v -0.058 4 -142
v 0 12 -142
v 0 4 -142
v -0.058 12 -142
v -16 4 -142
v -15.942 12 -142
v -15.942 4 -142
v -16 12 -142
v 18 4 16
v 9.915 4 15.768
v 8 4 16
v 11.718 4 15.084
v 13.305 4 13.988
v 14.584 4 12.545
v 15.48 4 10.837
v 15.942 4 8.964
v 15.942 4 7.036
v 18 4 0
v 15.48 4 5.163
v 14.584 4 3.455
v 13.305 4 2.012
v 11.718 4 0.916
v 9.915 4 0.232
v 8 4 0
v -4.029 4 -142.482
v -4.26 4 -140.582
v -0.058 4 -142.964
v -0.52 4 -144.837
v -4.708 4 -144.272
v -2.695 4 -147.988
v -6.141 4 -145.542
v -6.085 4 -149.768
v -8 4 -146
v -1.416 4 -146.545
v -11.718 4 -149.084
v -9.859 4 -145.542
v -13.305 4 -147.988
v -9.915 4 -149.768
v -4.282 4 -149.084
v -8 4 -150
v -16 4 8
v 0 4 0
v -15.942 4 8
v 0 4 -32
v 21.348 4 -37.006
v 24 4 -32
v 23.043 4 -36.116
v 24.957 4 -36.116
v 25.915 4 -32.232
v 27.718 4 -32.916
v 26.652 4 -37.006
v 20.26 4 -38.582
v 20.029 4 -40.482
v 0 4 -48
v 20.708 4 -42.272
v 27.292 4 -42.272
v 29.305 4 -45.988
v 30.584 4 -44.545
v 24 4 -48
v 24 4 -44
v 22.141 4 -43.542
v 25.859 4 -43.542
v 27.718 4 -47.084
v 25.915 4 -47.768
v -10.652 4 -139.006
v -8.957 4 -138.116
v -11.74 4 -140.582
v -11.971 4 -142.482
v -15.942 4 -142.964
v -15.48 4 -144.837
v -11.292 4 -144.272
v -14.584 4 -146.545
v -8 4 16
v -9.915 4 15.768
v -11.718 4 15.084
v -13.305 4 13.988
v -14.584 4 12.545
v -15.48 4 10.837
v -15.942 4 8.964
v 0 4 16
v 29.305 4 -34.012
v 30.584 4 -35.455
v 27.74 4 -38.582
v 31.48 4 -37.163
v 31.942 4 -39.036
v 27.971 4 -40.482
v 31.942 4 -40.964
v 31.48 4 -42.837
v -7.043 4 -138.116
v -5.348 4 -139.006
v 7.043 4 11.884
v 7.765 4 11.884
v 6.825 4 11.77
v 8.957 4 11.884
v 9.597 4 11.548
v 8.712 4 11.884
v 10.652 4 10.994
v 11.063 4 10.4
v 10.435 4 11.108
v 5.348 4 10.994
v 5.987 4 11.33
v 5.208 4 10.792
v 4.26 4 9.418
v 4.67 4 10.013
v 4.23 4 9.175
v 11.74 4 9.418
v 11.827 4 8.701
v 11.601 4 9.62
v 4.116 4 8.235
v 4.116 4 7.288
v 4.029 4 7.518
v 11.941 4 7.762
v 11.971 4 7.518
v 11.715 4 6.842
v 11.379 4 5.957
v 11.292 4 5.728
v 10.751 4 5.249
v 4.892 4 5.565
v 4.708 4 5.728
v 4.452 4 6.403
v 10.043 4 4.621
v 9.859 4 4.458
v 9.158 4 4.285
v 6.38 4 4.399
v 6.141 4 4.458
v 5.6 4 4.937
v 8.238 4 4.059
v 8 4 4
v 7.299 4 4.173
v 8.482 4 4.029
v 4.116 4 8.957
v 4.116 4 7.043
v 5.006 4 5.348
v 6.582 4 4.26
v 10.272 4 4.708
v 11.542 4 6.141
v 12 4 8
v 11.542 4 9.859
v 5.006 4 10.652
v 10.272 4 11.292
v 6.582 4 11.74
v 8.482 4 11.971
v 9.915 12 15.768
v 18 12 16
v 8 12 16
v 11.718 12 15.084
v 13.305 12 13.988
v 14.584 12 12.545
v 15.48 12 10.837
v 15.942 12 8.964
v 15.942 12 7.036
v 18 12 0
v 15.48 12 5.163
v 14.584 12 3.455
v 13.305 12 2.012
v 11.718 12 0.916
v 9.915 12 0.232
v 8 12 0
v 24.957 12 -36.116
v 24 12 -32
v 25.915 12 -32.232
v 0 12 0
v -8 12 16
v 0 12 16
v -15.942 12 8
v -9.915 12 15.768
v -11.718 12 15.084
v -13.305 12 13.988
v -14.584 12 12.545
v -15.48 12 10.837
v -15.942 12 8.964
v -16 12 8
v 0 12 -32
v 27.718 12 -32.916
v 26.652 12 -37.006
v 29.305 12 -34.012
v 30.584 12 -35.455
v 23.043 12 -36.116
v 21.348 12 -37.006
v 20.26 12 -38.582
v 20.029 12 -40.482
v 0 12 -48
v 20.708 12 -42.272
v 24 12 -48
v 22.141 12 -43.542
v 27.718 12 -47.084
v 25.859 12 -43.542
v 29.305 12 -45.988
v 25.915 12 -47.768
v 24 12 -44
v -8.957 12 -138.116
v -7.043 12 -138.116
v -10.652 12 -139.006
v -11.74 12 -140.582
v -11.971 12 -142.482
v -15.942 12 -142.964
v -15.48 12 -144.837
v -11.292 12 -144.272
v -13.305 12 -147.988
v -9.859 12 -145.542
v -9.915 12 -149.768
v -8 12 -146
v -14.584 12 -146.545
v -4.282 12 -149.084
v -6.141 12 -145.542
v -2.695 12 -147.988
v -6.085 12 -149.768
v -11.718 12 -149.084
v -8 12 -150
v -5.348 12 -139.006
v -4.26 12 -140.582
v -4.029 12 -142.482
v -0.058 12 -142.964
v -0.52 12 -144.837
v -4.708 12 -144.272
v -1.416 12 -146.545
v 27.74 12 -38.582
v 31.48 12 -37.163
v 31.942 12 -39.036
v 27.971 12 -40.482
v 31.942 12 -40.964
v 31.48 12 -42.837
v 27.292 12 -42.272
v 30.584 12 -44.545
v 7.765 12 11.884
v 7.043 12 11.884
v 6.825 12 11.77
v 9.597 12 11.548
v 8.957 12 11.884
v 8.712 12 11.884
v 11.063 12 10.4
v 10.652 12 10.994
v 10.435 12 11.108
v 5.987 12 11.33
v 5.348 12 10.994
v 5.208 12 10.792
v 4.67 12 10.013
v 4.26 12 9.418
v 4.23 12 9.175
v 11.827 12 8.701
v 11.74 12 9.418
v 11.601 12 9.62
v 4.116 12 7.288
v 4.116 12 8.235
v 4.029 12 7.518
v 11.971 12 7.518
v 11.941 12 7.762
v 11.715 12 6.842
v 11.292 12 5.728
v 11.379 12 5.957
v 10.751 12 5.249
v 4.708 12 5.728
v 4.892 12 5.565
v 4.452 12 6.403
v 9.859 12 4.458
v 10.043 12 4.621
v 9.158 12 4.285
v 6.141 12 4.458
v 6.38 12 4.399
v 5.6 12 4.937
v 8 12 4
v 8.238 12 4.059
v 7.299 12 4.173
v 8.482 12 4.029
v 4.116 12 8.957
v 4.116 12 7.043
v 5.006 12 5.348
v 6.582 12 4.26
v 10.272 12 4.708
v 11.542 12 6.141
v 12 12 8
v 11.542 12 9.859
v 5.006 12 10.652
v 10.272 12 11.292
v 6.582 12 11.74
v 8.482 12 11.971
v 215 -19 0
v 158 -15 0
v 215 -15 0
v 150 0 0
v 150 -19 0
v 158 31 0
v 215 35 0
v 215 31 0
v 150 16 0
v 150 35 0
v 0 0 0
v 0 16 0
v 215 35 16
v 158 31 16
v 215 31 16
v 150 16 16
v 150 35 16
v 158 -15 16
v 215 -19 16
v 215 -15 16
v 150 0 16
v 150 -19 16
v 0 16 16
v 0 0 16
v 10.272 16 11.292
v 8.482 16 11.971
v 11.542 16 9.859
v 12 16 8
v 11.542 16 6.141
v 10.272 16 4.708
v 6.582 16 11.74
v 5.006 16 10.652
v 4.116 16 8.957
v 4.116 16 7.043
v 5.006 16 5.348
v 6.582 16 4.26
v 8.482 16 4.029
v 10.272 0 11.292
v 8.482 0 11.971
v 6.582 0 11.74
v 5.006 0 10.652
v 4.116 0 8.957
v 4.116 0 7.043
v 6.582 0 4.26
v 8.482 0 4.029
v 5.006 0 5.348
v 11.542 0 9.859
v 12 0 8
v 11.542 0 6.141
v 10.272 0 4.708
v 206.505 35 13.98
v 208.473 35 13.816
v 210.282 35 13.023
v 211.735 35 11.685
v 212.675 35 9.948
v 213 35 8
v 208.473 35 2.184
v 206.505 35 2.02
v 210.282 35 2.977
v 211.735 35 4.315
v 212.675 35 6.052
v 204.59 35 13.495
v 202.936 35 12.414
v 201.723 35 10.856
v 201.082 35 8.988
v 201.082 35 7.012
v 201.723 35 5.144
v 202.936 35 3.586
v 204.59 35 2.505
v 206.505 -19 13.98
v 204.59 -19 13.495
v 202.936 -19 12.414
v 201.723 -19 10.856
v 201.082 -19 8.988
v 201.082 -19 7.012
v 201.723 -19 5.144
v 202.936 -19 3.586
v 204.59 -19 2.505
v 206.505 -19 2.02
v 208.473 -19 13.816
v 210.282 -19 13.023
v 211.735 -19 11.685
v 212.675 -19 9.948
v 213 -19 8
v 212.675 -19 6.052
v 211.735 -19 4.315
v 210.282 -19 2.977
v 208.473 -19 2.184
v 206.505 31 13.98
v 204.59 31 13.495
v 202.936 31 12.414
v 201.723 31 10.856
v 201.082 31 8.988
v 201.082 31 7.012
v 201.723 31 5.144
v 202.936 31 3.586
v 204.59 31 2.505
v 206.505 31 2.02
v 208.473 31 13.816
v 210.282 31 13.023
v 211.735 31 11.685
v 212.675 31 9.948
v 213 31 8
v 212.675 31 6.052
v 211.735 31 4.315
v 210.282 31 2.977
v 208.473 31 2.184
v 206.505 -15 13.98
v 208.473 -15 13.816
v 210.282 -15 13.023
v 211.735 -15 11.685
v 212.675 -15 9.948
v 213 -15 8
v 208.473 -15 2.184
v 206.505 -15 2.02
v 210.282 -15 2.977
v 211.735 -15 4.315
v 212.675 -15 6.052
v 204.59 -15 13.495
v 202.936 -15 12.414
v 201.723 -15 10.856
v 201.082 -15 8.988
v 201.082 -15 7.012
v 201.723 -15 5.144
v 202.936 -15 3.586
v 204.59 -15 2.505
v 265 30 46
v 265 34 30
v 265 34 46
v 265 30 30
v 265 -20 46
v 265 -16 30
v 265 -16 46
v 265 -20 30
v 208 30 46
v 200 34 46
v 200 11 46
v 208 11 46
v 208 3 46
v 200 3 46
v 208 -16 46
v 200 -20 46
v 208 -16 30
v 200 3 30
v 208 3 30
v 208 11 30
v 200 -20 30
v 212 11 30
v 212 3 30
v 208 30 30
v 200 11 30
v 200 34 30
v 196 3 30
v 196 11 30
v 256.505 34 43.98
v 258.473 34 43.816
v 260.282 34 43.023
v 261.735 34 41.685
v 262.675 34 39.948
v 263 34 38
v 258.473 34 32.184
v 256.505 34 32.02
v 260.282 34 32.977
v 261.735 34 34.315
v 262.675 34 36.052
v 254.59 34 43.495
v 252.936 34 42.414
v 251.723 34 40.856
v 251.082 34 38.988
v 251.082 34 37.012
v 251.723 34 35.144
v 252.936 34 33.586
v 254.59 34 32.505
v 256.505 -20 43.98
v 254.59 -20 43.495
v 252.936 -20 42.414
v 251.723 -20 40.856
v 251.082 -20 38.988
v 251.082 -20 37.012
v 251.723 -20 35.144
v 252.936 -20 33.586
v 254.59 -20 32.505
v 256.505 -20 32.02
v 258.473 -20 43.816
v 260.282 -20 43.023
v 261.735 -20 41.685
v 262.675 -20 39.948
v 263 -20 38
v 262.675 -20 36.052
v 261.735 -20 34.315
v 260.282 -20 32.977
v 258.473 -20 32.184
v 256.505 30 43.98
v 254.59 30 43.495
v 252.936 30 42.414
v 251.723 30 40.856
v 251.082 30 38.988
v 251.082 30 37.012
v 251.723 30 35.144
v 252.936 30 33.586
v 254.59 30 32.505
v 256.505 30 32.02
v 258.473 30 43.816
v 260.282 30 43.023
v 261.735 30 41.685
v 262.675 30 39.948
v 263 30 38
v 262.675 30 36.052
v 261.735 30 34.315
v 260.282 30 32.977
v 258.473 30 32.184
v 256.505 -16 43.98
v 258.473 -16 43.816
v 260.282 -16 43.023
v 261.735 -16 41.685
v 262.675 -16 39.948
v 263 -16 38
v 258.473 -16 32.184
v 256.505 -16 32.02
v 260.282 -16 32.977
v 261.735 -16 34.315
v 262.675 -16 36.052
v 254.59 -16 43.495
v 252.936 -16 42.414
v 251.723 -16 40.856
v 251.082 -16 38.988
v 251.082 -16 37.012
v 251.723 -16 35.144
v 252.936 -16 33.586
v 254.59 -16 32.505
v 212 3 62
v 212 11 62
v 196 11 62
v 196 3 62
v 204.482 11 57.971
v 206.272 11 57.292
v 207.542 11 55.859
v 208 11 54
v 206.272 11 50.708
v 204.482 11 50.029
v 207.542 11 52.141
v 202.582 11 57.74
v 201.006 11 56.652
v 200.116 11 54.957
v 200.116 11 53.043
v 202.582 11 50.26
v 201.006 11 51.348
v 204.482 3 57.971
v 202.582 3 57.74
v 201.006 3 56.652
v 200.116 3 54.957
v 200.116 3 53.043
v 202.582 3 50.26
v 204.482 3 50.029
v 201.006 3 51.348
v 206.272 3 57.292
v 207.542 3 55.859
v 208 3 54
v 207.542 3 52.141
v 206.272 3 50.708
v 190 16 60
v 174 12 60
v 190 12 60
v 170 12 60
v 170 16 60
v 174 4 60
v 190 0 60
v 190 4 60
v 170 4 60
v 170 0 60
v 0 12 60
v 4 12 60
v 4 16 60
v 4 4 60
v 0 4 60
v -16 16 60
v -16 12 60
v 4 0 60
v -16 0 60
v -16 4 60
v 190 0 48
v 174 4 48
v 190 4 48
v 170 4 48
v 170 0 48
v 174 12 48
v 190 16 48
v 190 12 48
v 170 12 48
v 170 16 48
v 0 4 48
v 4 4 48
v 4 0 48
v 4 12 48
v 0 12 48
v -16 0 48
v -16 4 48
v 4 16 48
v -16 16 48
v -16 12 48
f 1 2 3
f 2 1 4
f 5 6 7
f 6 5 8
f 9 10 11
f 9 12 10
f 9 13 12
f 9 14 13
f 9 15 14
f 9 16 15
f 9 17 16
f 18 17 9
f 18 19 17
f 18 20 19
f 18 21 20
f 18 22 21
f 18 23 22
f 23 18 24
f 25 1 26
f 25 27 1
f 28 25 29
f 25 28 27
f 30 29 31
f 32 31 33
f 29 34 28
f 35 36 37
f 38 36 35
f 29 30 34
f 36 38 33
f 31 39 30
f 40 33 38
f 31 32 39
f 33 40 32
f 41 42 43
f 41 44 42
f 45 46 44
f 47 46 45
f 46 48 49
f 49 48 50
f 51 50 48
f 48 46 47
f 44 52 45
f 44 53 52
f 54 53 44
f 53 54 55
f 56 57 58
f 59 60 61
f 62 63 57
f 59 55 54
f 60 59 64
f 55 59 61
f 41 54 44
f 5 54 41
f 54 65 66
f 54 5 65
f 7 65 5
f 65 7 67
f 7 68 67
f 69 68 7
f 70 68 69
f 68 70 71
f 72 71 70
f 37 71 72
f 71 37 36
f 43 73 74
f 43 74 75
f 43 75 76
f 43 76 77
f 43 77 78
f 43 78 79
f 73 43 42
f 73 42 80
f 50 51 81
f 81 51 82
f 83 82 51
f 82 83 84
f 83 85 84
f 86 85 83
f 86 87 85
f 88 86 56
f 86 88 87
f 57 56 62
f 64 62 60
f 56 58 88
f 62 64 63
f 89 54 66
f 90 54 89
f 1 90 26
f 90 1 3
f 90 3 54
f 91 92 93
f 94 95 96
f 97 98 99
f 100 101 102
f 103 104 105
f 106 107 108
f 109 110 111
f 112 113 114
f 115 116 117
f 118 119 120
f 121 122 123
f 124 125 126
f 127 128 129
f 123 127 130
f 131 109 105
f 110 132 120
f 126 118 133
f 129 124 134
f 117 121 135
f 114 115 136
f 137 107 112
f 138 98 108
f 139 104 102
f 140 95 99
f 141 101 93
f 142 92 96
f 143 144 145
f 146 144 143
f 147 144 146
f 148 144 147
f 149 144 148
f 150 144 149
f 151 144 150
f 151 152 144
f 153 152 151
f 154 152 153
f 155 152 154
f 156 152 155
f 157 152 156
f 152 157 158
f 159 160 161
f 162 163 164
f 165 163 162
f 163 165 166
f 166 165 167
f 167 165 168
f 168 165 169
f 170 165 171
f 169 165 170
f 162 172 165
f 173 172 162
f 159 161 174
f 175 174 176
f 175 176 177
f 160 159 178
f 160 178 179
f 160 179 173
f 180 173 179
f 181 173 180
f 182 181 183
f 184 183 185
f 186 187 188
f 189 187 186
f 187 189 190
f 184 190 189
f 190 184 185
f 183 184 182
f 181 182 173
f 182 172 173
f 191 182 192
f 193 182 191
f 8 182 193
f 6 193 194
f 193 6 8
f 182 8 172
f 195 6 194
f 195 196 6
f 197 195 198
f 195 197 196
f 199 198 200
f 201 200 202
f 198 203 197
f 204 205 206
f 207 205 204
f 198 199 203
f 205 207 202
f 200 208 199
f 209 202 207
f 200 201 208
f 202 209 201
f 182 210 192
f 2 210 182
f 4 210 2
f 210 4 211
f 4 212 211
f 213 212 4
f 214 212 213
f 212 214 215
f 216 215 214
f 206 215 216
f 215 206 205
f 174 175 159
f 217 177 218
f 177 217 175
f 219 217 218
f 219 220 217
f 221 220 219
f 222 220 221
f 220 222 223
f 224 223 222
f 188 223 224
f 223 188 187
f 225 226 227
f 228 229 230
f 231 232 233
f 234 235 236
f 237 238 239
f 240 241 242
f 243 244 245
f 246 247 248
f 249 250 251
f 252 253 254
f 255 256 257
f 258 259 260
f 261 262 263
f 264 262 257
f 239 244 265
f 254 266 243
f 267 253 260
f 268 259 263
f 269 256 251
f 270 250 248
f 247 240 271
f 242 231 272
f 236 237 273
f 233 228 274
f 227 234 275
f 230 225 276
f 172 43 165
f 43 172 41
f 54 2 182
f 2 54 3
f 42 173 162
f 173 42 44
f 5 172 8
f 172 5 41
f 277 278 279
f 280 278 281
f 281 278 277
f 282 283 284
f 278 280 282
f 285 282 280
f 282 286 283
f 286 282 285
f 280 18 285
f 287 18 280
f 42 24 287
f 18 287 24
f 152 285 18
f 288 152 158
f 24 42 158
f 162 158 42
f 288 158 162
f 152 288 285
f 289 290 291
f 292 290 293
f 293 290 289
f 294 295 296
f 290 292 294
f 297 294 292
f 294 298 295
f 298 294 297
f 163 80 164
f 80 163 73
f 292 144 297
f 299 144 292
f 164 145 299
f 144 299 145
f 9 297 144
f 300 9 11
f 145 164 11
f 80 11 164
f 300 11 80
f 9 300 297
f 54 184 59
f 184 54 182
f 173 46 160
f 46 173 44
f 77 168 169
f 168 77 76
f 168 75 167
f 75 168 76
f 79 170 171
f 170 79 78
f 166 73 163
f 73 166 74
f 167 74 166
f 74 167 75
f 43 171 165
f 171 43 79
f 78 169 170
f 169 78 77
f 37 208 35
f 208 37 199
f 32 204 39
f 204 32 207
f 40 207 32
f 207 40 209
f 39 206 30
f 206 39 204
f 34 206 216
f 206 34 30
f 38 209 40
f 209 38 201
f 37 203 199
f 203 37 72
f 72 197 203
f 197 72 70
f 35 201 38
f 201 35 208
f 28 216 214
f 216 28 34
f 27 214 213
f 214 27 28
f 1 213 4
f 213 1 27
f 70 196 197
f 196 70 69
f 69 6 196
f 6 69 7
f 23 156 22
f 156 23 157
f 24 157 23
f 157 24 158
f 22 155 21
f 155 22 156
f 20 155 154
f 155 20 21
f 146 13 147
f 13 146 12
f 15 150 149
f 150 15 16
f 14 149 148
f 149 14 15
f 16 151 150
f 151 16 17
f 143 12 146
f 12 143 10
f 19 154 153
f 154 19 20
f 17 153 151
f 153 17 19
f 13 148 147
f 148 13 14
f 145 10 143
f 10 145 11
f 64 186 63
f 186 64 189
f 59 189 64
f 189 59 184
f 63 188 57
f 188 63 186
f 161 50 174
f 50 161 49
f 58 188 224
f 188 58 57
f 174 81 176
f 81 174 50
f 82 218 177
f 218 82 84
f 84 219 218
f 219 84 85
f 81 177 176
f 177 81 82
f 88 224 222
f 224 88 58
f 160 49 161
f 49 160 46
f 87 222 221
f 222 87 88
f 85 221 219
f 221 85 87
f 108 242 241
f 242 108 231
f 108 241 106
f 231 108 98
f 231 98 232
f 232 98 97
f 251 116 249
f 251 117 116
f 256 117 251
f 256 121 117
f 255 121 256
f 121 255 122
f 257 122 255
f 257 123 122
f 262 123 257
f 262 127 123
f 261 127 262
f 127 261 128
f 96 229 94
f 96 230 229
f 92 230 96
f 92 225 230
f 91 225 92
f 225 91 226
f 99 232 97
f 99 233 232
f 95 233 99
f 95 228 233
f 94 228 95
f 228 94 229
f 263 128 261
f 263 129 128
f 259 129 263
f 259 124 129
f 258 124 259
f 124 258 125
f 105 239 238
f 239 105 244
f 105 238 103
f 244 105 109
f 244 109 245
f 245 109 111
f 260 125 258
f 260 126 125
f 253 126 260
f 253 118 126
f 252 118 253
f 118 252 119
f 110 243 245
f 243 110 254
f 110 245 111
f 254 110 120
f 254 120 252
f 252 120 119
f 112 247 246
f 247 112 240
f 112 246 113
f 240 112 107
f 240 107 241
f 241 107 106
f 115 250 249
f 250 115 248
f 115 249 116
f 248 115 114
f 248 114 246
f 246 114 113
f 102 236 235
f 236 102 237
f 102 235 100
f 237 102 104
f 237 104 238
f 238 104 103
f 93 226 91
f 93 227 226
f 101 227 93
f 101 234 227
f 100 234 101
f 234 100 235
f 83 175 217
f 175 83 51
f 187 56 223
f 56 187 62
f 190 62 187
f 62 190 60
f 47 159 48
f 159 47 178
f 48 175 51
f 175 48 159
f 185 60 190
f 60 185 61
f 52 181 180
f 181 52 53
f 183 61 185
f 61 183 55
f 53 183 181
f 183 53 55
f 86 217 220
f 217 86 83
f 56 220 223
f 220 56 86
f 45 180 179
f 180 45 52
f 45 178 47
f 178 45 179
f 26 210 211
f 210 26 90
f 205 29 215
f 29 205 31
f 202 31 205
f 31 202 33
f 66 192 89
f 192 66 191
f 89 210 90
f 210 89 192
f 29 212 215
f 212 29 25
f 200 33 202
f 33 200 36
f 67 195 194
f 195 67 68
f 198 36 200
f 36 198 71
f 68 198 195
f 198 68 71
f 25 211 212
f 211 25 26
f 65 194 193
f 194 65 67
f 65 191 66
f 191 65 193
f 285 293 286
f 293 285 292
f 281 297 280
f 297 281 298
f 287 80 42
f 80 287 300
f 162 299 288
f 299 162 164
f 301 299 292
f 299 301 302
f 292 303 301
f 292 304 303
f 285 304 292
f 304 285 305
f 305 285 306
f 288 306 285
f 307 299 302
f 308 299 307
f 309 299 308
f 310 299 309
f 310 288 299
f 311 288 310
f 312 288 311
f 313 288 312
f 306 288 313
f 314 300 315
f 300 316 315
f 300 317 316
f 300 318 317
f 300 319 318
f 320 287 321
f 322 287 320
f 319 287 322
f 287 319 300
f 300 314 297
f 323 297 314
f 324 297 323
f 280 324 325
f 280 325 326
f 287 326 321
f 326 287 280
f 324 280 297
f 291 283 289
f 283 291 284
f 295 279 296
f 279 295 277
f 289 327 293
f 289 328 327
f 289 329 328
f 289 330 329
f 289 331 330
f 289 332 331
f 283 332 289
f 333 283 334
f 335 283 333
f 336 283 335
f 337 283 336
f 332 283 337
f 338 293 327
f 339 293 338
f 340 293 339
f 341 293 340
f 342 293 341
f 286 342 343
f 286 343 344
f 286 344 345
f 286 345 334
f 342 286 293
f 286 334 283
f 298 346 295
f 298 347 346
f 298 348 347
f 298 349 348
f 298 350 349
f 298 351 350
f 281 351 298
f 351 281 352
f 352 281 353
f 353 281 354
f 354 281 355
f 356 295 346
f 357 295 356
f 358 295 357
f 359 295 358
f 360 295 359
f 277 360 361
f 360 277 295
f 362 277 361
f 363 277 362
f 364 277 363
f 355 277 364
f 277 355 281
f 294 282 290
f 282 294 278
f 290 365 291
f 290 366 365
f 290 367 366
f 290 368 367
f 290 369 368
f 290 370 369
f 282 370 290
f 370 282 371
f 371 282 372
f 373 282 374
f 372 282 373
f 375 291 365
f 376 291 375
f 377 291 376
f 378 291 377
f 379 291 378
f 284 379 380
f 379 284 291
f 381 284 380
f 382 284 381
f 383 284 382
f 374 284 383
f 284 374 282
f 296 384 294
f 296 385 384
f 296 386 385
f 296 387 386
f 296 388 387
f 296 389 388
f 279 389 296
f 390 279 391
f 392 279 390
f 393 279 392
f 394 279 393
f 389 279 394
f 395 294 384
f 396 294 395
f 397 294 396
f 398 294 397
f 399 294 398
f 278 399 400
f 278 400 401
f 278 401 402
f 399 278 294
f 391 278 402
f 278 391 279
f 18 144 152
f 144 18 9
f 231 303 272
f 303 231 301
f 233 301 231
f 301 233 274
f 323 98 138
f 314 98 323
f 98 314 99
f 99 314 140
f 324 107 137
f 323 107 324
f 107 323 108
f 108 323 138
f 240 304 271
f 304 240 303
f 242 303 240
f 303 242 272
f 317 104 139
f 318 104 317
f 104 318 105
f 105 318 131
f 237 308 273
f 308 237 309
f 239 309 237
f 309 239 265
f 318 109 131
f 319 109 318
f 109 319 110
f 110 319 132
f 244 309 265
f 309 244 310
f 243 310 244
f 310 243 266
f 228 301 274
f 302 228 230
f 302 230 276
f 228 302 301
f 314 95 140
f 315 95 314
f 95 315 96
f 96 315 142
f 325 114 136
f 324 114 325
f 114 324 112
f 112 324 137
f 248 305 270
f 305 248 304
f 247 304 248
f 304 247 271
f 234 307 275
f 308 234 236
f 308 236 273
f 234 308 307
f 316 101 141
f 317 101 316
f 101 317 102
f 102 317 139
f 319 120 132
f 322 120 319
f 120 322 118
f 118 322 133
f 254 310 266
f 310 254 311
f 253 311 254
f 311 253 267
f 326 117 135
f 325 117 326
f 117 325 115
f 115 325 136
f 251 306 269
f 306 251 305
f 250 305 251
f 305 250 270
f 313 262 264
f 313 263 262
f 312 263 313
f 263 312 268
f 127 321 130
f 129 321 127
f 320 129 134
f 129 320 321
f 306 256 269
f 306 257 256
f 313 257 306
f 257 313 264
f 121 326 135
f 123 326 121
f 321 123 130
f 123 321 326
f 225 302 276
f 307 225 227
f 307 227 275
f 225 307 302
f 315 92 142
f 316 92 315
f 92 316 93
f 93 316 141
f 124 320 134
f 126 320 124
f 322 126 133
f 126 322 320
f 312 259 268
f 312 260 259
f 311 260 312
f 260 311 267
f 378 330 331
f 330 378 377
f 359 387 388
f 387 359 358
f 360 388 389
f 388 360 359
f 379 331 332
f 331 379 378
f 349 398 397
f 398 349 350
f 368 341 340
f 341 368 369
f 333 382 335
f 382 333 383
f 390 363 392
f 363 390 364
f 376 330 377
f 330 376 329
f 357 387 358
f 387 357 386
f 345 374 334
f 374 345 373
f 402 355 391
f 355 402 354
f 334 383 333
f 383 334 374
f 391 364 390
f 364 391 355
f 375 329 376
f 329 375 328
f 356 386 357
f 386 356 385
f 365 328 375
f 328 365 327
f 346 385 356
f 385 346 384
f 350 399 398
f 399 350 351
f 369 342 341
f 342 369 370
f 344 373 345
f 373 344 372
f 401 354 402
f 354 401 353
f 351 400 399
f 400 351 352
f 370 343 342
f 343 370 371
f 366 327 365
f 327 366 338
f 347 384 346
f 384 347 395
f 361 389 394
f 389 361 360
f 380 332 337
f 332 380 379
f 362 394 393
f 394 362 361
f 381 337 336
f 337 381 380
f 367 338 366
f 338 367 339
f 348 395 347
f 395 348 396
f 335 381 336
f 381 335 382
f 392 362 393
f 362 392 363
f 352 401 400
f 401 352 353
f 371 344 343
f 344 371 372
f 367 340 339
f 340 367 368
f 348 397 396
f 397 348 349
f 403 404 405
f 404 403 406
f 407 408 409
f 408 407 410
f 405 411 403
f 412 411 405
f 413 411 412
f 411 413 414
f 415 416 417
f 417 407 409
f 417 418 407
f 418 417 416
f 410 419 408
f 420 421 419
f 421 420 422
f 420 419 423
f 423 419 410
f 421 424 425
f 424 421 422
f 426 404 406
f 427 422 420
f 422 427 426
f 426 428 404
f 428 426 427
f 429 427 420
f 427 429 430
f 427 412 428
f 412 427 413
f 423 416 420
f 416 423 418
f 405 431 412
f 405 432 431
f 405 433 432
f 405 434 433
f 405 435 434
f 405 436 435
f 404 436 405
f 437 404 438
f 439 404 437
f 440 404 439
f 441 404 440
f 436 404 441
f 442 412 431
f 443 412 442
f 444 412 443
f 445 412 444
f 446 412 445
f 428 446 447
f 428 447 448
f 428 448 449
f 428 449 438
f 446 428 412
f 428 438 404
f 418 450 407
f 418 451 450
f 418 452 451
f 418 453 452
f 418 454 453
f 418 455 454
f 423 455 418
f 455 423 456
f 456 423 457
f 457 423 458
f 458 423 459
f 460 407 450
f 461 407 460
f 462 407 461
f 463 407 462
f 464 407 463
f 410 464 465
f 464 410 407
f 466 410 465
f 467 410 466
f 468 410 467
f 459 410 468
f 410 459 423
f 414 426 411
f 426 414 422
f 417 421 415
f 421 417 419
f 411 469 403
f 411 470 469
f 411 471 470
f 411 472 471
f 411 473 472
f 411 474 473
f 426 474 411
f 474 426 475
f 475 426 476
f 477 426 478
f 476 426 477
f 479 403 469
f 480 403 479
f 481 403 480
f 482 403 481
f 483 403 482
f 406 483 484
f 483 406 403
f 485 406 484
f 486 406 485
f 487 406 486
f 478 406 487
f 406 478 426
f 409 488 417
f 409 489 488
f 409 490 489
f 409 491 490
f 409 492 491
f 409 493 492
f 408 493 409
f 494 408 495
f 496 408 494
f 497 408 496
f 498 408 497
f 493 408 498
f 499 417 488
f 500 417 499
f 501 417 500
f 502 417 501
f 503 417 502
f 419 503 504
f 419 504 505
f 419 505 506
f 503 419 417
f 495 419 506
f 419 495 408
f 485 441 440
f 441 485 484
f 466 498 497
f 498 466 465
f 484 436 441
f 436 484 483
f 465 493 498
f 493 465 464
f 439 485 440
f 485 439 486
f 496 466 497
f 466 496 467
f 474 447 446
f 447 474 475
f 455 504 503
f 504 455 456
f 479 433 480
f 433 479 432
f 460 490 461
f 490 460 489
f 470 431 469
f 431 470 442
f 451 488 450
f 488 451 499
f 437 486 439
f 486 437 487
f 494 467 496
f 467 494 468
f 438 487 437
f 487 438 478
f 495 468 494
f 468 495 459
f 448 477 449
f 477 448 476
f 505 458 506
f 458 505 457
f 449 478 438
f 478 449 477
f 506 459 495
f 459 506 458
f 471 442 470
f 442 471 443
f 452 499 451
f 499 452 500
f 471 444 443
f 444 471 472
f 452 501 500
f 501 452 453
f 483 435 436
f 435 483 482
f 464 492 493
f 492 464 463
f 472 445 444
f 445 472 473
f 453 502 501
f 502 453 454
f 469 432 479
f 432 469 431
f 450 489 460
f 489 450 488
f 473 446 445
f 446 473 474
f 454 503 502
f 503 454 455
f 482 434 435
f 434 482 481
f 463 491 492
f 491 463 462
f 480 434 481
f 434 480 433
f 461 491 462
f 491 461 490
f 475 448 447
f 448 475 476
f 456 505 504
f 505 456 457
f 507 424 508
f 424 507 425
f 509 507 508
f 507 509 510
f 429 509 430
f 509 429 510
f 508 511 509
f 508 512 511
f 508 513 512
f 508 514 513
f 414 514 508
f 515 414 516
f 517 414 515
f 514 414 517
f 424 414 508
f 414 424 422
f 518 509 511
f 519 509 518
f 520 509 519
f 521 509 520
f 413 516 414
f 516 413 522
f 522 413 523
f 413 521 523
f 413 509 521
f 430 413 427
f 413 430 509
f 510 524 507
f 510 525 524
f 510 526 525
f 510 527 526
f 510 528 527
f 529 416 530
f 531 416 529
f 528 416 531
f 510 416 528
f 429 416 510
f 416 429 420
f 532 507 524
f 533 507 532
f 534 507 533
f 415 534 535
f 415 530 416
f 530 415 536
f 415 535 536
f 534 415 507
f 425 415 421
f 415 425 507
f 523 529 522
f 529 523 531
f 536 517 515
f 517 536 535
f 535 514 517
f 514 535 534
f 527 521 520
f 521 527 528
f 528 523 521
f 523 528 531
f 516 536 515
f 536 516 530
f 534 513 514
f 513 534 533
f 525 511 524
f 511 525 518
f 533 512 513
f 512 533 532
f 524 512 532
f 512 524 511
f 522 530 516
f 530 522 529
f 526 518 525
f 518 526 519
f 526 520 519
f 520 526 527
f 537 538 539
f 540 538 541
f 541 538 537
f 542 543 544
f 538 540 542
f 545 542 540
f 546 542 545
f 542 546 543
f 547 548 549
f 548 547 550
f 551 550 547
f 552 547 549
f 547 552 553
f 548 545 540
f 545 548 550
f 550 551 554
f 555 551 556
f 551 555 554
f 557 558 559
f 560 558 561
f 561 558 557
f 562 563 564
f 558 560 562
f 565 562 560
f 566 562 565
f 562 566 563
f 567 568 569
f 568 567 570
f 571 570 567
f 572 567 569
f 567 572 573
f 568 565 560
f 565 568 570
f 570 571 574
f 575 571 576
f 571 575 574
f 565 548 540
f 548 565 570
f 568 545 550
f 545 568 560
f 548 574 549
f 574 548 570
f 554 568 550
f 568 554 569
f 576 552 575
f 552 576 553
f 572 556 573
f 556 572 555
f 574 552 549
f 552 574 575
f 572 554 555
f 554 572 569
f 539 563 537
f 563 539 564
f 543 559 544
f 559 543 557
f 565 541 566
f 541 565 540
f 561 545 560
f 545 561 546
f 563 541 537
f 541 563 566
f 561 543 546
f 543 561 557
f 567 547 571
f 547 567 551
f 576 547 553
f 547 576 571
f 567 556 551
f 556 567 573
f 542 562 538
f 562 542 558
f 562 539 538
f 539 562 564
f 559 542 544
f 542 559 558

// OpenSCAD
// file: misc.scad
// generic public modules

module t(x,y,z){ translate([x,y,z]) children(); }
module r(x,y,z){ rotate([x,y,z]) children(); }

module flipx(){ rotate([90,0,0]) children(); }
module flipy(){ rotate([0,90,0]) children(); }
module flipz(){ rotate([0,0,90]) children(); }
module flip_x(){ rotate([-90,0,0]) children(); }
module flip_y(){ rotate([0,-90,0]) children(); }
module flip_z(){ rotate([0,0,-90]) children(); }


// RotateTranslate().  Rotate by rx,ry,rz and translate by x,y,z.  Rotate is optional since rx,ry,rz default to 0.
module rt(x,y,z,rx=0,ry=0,rz=0){ translate([x,y,z]) rotate([rx,ry,rz]) children(); }


// square tube
module sq_tube(length, width, height, wall){ // wall is wall thickness
    translate([0,0,height/2]) difference(){
        cube([length,width,height], true);
        cube([length-2*wall, width-2*wall, height+2], true);
    }
}
// file: bb24const.scad
// Breaker Bot 2024 toandrey(at)yahoo(dot)com

disk_id = 25;
disk_od = 95;
disk_h  = 1.25;

bl = 54; // beam length
fw = 54; // frame width
fl = 16+disk_od+3; // frame length

hole_tolerance = 0.1;
pipe_wall_thick=1.5;

bearing_od=22; // 608 bearing outer diameter

shaft_round = 8; // 608 bearings fit an 8mm round shaft
// if you grind an end of a round shaft into a square, it will be this size
shaft_square = sqrt(shaft_round*shaft_round/2);
echo("Shaft end square size", shaft_square);
// main file
// Breaker Bot 2024 toandrey(at)yahoo(dot)com
include <bb24const.scad>
use <misc.scad>

knee_offset = 40;
thigh_len = 150;


/////////////////////// public modules ///////////////////////

module shin(){ // public
    difference(){
        union(){
            cube([thigh_len,16,8]);
            translate([-8,8,0]) cube([16,16,8]);
            translate([knee_offset,8,0]) cube([16,32,8]);

            translate([0,8,0]) cylinder(8,8,8);
            translate([thigh_len,8,0]) cylinder(8,8,8);
            translate([0,24,0]) cylinder(8,8,8);
            translate([knee_offset+8,40,0]) cylinder(8,8,8);
        }
        translate([0,24,-1]) cylinder(10,4,4);
        translate([knee_offset+8,40,-1]) cylinder(10,4,4);
        translate([thigh_len,8,-1]) cylinder(10,4,4);
    }
}


module thigh(){ // public
    difference(){
        union(){
            cube([thigh_len, 16,16]);
            translate([thigh_len, 8-fw/2, 0]) cube([fl/2+8,fw,16]);
        }
        translate([thigh_len+8, 12-fw/2, -1]) cube([fl/2+8,fw-8,18]);
        translate([-1,4,-1]) cube([19,8,18]);
        translate([8,17,8]) flipx() cylinder(20,4,4);
        translate([thigh_len+fl/2,fw/2+14,8]) flipx() cylinder(fw+12,6,6);
    }
}


module hip(){ // public
    difference(){
        union(){
            translate([0,0,0]) cube([fl/2+8,fw,16]);
        }
        translate([8,4,-1]) cube([fl/2+8,fw-8,18]);
        translate([fl/2,-1,8]) rotate([-90,0,0]) cylinder(fw+12,6,6);
    }
    difference(){
        translate([-4,fw/2-4,0]) cube([16, 8, 32]);
        translate([4,0,24]) rotate([-90,0,0]) cylinder(fw,4,4);
    }
}


module pushrod(){ // public
    len = thigh_len+knee_offset-16;
    difference(){
        union(){
            cube([len,8,12]);
            translate([-16,-4,0]) cube([20,16,12]);
            translate([len-4,-4,0]) cube([20,16,12]);
        }
        translate([-20,0,-1]) cube([20,8,14]);
        translate([len,0,-1]) cube([20,8,14]);
        translate([-8,-8,6]) rotate([-90,0,0]) %cylinder(24,4,4);
        translate([len+8,-8,6]) rotate([-90,0,0]) %cylinder(24,4,4);
    }
}


translate([-16,12,8]) flipy() flipx() shin();
thigh();
translate([200,-20, 30]) hip();
translate([0,4, 48]) pushrod();
